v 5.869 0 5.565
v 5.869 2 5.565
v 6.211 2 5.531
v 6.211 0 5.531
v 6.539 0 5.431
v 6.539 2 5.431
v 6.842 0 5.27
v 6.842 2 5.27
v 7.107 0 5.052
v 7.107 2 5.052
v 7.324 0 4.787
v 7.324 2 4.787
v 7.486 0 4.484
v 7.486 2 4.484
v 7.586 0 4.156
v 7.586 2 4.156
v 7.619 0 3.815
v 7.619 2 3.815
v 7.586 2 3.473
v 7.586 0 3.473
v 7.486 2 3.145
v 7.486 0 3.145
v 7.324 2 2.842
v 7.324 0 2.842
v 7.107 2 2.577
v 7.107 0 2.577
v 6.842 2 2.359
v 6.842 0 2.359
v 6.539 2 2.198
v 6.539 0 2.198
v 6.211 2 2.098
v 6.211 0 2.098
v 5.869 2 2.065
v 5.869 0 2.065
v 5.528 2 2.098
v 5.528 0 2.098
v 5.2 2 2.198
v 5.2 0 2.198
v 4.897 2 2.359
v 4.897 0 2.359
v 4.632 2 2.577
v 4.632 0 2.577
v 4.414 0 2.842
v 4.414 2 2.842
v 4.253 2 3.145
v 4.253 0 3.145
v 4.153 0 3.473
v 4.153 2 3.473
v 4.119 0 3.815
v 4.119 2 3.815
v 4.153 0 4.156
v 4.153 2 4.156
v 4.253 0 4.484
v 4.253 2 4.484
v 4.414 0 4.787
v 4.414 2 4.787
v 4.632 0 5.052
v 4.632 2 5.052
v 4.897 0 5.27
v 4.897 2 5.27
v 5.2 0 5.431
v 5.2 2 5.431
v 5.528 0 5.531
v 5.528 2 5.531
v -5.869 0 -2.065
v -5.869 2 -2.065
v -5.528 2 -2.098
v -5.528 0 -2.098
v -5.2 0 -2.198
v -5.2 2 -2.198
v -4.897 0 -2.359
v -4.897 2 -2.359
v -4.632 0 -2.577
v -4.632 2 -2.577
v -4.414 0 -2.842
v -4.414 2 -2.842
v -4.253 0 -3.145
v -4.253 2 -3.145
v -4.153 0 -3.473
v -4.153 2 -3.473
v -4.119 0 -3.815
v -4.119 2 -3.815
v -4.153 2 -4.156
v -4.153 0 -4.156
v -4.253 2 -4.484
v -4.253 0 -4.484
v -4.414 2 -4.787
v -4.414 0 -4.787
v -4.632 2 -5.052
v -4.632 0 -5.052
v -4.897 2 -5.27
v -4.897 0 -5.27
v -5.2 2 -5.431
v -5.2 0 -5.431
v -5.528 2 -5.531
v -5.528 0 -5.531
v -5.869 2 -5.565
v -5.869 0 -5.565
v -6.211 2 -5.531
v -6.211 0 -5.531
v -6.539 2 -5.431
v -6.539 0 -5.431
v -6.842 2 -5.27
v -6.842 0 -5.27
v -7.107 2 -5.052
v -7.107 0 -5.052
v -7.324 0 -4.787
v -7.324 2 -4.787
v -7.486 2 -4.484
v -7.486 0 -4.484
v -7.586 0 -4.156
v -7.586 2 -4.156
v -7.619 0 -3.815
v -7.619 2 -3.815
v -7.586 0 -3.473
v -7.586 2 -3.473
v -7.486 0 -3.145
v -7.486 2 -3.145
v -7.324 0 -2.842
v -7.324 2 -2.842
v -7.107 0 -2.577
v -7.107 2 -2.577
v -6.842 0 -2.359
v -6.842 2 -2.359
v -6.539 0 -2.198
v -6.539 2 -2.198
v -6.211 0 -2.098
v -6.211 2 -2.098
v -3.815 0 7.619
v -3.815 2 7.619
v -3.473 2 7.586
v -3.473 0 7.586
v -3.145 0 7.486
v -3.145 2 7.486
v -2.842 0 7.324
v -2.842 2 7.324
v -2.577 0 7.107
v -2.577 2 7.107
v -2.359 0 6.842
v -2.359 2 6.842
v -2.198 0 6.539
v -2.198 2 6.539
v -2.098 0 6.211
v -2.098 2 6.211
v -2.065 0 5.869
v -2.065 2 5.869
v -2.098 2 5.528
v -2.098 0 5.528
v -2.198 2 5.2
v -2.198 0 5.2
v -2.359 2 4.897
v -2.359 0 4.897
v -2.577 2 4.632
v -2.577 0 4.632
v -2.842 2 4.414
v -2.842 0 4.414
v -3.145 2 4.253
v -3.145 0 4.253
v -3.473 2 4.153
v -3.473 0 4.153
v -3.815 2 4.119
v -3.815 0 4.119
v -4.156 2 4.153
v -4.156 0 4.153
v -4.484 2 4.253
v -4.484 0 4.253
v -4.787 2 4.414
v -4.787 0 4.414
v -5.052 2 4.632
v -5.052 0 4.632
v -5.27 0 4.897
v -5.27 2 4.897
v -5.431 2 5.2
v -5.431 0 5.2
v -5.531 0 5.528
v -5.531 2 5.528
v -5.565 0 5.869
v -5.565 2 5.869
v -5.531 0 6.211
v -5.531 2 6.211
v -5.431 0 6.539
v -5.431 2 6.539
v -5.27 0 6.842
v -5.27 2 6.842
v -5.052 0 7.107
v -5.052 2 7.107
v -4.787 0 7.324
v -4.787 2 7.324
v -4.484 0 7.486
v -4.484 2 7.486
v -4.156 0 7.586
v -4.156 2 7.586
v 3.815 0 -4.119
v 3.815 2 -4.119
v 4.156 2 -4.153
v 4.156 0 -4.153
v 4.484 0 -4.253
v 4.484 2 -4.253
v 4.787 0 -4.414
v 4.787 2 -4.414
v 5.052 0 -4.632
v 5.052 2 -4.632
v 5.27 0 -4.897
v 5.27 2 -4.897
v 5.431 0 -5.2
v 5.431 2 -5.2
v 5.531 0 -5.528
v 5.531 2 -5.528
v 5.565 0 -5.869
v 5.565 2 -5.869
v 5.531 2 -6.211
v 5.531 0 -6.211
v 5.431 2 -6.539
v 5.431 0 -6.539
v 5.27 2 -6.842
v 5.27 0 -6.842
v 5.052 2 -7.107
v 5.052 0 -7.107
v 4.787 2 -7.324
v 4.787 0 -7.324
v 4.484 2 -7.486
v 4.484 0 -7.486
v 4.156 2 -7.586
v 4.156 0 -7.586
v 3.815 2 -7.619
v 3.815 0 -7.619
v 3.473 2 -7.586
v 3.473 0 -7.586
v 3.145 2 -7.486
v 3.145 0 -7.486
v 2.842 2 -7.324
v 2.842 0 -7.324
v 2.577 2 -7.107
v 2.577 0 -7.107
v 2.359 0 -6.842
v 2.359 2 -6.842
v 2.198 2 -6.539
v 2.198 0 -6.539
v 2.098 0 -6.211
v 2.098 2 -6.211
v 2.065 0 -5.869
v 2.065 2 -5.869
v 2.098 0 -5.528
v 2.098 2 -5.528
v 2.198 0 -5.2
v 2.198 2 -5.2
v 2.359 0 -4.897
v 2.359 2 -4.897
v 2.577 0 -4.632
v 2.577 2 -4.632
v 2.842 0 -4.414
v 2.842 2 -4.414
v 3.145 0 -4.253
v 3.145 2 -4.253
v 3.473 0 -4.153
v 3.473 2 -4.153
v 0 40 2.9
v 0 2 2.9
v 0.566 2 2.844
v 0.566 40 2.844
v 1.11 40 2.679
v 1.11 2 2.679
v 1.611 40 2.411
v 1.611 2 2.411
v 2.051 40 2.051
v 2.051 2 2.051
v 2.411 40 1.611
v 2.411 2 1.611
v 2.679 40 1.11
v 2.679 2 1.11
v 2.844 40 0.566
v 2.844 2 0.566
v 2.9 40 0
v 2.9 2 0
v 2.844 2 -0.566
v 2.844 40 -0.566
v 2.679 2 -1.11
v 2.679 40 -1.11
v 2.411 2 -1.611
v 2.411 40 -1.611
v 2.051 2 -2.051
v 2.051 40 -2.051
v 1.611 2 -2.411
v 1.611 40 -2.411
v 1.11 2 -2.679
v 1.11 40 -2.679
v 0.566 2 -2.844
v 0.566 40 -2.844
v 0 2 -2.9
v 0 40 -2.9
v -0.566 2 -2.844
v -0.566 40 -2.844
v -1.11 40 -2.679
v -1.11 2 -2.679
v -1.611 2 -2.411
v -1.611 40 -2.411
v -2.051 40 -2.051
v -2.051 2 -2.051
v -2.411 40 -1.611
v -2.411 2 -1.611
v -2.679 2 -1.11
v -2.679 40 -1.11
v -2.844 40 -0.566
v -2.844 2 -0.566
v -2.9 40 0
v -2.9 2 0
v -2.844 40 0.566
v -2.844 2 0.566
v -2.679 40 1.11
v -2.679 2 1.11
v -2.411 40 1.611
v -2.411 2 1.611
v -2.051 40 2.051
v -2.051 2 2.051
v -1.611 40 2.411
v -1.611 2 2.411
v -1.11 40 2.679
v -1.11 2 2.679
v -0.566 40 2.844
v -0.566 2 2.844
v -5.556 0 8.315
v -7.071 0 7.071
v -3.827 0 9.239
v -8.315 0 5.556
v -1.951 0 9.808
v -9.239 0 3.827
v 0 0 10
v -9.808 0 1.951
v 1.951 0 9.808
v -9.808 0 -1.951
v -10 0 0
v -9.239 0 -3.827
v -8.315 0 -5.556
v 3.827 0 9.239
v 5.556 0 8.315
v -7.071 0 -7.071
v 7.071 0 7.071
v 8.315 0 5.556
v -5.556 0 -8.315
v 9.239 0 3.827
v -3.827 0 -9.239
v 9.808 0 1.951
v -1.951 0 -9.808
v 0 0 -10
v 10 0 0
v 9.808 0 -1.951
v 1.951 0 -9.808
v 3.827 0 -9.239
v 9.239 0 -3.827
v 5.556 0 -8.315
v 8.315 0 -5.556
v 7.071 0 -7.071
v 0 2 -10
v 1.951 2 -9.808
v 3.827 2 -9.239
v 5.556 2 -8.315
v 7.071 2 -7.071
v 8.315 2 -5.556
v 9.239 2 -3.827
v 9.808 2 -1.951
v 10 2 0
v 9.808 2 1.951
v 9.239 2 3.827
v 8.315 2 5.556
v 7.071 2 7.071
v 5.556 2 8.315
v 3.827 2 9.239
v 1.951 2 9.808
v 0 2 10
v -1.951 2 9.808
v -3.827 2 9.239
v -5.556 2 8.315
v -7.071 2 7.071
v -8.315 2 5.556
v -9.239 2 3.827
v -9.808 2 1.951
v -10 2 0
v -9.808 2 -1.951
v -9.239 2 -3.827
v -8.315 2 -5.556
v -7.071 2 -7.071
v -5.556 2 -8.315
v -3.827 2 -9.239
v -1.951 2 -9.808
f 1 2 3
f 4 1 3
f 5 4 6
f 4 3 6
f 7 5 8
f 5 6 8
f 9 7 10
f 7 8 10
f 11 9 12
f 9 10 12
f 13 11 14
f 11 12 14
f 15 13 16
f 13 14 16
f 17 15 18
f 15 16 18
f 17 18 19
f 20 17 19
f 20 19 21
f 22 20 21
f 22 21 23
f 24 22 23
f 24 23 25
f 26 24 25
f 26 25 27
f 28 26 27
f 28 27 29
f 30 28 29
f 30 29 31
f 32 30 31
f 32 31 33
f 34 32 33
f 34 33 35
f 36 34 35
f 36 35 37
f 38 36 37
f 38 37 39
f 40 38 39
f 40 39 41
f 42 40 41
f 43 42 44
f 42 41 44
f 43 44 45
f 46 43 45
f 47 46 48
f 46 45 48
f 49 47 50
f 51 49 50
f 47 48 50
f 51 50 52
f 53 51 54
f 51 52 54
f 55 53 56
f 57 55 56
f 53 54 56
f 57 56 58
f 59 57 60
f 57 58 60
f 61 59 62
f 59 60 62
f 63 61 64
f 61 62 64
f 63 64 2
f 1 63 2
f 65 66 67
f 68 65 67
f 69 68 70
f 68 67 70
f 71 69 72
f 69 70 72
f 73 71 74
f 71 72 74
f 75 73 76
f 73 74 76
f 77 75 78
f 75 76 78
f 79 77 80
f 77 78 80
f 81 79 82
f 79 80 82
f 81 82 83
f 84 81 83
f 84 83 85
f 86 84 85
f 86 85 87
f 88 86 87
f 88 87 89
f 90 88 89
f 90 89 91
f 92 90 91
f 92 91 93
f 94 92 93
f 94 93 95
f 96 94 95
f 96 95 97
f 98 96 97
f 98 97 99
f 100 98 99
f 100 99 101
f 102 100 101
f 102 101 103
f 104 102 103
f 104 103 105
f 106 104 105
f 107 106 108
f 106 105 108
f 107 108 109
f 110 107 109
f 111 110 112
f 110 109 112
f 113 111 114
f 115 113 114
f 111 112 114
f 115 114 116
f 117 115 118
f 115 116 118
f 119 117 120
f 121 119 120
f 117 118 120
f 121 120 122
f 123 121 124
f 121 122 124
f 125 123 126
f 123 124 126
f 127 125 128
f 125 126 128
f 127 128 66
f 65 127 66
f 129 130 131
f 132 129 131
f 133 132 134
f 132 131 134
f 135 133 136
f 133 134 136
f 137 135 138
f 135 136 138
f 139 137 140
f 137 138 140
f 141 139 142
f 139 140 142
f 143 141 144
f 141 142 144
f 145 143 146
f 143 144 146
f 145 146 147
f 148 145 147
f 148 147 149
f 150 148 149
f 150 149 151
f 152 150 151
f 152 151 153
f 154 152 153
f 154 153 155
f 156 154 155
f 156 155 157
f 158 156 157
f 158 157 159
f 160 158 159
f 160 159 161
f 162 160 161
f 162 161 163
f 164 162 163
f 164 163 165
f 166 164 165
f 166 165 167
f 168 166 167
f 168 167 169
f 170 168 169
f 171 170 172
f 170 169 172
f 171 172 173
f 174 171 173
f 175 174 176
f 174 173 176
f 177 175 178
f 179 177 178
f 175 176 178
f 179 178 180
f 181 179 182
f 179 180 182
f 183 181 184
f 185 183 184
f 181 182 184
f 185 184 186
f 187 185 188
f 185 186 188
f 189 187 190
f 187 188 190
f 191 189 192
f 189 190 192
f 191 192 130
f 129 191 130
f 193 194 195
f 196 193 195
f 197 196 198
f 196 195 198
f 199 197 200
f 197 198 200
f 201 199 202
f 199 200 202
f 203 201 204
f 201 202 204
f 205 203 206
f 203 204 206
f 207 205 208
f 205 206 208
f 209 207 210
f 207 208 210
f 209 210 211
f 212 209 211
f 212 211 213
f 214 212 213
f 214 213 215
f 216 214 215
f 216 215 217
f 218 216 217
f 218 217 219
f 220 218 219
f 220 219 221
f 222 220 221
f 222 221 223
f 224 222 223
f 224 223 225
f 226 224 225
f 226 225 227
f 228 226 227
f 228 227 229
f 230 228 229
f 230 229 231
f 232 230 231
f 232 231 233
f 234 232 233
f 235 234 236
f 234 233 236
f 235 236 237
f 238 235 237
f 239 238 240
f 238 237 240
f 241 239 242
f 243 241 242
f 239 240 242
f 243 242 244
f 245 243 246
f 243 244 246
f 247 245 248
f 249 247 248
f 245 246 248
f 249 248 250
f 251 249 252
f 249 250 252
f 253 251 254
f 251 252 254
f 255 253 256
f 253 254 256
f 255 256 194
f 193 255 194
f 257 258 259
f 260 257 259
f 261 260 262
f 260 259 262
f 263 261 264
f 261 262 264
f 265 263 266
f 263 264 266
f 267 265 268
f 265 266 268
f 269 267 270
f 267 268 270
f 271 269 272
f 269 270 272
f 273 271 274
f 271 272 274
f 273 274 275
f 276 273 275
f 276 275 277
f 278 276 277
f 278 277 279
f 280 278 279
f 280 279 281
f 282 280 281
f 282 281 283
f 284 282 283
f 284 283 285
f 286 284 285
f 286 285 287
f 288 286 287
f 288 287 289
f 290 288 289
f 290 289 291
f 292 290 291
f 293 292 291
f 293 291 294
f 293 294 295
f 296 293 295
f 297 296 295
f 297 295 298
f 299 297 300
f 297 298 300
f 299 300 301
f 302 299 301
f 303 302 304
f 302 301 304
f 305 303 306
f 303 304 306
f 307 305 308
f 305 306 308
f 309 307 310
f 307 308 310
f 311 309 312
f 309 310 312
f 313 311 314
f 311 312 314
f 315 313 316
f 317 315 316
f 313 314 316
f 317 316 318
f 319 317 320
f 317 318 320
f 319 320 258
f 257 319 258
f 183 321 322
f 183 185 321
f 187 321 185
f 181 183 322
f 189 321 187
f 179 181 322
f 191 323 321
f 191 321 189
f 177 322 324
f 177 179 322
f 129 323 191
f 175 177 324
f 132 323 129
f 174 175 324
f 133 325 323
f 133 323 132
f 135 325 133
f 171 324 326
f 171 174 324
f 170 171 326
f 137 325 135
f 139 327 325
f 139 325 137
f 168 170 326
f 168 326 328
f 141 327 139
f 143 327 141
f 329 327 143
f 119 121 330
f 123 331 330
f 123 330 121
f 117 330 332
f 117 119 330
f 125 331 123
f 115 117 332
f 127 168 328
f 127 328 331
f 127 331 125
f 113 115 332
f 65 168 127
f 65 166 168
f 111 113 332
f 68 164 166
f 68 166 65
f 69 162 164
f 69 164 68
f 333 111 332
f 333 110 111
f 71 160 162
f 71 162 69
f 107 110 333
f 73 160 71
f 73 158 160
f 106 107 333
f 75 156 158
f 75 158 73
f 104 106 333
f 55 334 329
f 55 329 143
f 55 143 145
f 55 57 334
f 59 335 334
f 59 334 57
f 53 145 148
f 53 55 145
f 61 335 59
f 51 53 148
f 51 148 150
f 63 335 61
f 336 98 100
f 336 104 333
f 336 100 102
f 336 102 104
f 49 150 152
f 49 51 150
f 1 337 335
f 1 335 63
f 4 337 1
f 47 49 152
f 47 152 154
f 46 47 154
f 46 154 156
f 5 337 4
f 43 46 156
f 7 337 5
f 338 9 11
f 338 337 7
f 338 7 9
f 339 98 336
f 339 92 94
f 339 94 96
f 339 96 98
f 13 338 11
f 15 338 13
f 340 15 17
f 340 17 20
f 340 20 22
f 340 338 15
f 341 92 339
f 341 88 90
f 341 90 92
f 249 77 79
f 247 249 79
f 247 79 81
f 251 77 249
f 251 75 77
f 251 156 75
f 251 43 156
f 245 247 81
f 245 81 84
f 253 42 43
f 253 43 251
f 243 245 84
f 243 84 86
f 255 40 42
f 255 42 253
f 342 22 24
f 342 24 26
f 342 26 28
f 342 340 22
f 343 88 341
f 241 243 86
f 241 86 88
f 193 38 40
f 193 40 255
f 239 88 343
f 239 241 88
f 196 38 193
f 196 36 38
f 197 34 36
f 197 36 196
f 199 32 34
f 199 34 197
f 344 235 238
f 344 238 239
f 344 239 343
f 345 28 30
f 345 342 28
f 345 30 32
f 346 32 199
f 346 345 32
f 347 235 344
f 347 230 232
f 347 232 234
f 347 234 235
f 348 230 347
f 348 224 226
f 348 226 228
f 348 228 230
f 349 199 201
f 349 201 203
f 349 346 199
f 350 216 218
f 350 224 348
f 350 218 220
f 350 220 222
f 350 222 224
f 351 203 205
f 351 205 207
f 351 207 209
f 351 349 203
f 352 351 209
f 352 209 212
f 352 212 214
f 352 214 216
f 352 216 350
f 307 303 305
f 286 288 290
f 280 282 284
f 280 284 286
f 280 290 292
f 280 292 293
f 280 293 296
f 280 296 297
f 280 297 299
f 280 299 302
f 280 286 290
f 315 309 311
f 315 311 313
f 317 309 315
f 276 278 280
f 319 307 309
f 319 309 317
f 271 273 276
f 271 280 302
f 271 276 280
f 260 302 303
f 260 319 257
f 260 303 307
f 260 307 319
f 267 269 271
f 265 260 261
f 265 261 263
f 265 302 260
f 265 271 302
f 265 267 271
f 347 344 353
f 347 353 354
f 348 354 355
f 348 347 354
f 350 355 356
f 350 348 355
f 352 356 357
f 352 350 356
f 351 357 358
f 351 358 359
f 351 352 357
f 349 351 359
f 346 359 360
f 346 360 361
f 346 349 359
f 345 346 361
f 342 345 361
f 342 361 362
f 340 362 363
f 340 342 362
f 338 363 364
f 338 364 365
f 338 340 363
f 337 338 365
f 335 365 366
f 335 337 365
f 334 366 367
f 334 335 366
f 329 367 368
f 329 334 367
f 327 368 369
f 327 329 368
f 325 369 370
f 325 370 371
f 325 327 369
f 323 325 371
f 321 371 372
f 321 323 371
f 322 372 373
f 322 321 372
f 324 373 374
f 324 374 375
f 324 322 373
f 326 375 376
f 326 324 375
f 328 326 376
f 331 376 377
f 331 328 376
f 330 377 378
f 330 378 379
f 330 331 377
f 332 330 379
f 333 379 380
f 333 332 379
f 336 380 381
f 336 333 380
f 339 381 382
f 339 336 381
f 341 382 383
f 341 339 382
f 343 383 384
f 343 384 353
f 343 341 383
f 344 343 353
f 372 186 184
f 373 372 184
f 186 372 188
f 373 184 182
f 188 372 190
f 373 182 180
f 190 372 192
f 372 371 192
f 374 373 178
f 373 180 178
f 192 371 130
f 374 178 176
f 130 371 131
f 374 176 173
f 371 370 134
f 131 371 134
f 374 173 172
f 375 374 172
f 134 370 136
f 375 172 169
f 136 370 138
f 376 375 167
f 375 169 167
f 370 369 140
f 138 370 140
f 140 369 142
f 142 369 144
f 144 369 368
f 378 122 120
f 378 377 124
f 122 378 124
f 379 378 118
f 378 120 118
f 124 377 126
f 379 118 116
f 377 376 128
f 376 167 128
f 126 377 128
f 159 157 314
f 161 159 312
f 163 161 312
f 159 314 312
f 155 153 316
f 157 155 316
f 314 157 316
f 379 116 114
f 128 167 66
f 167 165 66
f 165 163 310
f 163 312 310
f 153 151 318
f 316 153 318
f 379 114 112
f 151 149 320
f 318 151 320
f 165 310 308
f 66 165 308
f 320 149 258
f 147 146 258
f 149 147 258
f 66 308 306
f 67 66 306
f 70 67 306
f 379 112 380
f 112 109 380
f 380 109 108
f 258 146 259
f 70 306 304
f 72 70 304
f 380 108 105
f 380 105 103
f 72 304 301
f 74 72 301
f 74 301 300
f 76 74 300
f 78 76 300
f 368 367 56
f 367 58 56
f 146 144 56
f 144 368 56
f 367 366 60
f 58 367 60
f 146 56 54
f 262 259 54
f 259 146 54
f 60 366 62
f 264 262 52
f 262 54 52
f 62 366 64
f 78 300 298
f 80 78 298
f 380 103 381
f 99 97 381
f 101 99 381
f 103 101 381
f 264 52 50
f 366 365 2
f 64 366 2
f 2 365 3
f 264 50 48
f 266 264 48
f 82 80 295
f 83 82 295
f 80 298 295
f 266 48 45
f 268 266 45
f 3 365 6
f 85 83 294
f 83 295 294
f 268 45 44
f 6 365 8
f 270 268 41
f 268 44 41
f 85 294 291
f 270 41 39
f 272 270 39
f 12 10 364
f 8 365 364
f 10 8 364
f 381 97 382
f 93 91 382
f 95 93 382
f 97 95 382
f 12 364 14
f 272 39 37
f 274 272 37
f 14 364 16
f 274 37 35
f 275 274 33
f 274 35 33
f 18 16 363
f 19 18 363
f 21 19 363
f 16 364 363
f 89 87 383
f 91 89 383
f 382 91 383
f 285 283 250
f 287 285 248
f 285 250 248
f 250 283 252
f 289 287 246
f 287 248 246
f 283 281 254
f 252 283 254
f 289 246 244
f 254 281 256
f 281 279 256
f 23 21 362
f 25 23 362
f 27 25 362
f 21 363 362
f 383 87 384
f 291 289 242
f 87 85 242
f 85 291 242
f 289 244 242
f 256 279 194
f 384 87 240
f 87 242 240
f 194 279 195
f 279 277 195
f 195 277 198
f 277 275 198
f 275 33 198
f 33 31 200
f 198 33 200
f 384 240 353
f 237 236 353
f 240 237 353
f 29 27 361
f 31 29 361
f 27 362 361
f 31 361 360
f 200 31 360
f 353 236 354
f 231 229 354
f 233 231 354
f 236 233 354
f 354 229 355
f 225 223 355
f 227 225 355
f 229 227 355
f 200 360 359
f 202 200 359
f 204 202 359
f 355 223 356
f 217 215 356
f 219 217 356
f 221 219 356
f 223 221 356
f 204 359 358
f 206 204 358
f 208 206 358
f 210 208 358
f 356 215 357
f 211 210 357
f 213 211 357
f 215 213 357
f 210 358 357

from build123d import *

# Parameters (mm, degrees)
SKETCH_1_R          = 2.9
EXTRUDE_1_DEPTH     = 40
SKETCH_2_R          = 10
EXTRUDE_2_DEPTH     = 2
SKETCH_3_R          = 1.75
CUT_EXTRUDE_1_DEPTH = 3


with BuildPart() as part:
    # 草图1 → 凸台-拉伸1 (new body)
    with BuildSketch(Plane(origin=(0, 0, 0), x_dir=(1, 0, 0), z_dir=(0, 1, 0))):
        with Locations(Location((0, 0, 0), (0, 0, 270))):
            Circle(SKETCH_1_R)
    extrude(amount=EXTRUDE_1_DEPTH)

    # 草图2 → 凸台-拉伸2 (add)
    with BuildSketch(Plane.XZ):
        with Locations(Location((0, 0, 0), (0, 0, 270))):
            Circle(SKETCH_2_R)
    extrude(amount=-EXTRUDE_2_DEPTH)

    # 草图3 → 切除-拉伸1 (cut)
    with BuildSketch(Plane(origin=(0, 2, 0), x_dir=(1, 0, 0), z_dir=(0, 1, 0))):
        with Locations(Location((-3.814504668, -5.869398434, 0), (0, 0, 270))):
            Circle(SKETCH_3_R)
        with Locations(Location((-5.869398434, 3.814504668, 0), (0, 0, 270))):
            Circle(SKETCH_3_R)
        with Locations(Location((3.814504668, 5.869398434, 0), (0, 0, 270))):
            Circle(SKETCH_3_R)
        with Locations(Location((5.869398434, -3.814504668, 0), (0, 0, 270))):
            Circle(SKETCH_3_R)
    extrude(amount=-CUT_EXTRUDE_1_DEPTH, mode=Mode.SUBTRACT)


solid = part.part
